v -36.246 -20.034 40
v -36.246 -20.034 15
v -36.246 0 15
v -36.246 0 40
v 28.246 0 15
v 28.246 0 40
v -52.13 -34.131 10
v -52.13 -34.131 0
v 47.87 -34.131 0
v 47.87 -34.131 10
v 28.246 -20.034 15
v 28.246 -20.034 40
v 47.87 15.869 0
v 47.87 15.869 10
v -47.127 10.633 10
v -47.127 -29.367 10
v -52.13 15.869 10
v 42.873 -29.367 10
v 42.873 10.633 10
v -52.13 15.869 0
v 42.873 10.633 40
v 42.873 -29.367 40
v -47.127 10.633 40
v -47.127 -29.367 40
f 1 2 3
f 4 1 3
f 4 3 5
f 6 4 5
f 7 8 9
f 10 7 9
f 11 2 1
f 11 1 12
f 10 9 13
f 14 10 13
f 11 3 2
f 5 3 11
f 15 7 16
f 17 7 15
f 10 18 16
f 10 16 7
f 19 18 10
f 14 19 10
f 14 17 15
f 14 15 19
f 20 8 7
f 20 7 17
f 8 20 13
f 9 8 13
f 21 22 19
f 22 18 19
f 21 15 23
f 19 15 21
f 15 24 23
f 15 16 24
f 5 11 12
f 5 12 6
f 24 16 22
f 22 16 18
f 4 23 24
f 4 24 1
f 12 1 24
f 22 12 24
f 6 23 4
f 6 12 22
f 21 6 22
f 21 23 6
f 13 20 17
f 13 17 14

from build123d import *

# Parameters (mm, degrees)
F0_W     = 100
F0_H     = 50
F1_DEPTH = 10
F2_W     = 90
F2_H     = 40
F3_DEPTH = 5
F4_W     = 90
F4_H     = 40
F4_W_2   = 64.491807
F4_H_2   = 20.034401
F5_DEPTH = 25


with BuildPart() as f1:
    # F0 (on Top) → F1 (new body)
    with BuildSketch(Plane.XY):
        with Locations((-2.130391, -9.130959)):
            Rectangle(F0_W, F0_H)
    extrude(amount=F1_DEPTH)

    # F2 (on face) → F3 (join)
    with BuildSketch(Plane.XY.offset(10)):
        with Locations((-2.126822, -9.367195)):
            Rectangle(F2_W, F2_H)
    extrude(amount=F3_DEPTH)

    # F4 (on face) → F5 (join)
    with BuildSketch(Plane.XY.offset(15)):
        with Locations((-2.126822, -9.367195)):
            Rectangle(F4_W, F4_H)
        with Locations((-3.999688, -10.0172)):
            Rectangle(F4_W_2, F4_H_2, mode=Mode.SUBTRACT)
    extrude(amount=F5_DEPTH)


solid = f1.part
